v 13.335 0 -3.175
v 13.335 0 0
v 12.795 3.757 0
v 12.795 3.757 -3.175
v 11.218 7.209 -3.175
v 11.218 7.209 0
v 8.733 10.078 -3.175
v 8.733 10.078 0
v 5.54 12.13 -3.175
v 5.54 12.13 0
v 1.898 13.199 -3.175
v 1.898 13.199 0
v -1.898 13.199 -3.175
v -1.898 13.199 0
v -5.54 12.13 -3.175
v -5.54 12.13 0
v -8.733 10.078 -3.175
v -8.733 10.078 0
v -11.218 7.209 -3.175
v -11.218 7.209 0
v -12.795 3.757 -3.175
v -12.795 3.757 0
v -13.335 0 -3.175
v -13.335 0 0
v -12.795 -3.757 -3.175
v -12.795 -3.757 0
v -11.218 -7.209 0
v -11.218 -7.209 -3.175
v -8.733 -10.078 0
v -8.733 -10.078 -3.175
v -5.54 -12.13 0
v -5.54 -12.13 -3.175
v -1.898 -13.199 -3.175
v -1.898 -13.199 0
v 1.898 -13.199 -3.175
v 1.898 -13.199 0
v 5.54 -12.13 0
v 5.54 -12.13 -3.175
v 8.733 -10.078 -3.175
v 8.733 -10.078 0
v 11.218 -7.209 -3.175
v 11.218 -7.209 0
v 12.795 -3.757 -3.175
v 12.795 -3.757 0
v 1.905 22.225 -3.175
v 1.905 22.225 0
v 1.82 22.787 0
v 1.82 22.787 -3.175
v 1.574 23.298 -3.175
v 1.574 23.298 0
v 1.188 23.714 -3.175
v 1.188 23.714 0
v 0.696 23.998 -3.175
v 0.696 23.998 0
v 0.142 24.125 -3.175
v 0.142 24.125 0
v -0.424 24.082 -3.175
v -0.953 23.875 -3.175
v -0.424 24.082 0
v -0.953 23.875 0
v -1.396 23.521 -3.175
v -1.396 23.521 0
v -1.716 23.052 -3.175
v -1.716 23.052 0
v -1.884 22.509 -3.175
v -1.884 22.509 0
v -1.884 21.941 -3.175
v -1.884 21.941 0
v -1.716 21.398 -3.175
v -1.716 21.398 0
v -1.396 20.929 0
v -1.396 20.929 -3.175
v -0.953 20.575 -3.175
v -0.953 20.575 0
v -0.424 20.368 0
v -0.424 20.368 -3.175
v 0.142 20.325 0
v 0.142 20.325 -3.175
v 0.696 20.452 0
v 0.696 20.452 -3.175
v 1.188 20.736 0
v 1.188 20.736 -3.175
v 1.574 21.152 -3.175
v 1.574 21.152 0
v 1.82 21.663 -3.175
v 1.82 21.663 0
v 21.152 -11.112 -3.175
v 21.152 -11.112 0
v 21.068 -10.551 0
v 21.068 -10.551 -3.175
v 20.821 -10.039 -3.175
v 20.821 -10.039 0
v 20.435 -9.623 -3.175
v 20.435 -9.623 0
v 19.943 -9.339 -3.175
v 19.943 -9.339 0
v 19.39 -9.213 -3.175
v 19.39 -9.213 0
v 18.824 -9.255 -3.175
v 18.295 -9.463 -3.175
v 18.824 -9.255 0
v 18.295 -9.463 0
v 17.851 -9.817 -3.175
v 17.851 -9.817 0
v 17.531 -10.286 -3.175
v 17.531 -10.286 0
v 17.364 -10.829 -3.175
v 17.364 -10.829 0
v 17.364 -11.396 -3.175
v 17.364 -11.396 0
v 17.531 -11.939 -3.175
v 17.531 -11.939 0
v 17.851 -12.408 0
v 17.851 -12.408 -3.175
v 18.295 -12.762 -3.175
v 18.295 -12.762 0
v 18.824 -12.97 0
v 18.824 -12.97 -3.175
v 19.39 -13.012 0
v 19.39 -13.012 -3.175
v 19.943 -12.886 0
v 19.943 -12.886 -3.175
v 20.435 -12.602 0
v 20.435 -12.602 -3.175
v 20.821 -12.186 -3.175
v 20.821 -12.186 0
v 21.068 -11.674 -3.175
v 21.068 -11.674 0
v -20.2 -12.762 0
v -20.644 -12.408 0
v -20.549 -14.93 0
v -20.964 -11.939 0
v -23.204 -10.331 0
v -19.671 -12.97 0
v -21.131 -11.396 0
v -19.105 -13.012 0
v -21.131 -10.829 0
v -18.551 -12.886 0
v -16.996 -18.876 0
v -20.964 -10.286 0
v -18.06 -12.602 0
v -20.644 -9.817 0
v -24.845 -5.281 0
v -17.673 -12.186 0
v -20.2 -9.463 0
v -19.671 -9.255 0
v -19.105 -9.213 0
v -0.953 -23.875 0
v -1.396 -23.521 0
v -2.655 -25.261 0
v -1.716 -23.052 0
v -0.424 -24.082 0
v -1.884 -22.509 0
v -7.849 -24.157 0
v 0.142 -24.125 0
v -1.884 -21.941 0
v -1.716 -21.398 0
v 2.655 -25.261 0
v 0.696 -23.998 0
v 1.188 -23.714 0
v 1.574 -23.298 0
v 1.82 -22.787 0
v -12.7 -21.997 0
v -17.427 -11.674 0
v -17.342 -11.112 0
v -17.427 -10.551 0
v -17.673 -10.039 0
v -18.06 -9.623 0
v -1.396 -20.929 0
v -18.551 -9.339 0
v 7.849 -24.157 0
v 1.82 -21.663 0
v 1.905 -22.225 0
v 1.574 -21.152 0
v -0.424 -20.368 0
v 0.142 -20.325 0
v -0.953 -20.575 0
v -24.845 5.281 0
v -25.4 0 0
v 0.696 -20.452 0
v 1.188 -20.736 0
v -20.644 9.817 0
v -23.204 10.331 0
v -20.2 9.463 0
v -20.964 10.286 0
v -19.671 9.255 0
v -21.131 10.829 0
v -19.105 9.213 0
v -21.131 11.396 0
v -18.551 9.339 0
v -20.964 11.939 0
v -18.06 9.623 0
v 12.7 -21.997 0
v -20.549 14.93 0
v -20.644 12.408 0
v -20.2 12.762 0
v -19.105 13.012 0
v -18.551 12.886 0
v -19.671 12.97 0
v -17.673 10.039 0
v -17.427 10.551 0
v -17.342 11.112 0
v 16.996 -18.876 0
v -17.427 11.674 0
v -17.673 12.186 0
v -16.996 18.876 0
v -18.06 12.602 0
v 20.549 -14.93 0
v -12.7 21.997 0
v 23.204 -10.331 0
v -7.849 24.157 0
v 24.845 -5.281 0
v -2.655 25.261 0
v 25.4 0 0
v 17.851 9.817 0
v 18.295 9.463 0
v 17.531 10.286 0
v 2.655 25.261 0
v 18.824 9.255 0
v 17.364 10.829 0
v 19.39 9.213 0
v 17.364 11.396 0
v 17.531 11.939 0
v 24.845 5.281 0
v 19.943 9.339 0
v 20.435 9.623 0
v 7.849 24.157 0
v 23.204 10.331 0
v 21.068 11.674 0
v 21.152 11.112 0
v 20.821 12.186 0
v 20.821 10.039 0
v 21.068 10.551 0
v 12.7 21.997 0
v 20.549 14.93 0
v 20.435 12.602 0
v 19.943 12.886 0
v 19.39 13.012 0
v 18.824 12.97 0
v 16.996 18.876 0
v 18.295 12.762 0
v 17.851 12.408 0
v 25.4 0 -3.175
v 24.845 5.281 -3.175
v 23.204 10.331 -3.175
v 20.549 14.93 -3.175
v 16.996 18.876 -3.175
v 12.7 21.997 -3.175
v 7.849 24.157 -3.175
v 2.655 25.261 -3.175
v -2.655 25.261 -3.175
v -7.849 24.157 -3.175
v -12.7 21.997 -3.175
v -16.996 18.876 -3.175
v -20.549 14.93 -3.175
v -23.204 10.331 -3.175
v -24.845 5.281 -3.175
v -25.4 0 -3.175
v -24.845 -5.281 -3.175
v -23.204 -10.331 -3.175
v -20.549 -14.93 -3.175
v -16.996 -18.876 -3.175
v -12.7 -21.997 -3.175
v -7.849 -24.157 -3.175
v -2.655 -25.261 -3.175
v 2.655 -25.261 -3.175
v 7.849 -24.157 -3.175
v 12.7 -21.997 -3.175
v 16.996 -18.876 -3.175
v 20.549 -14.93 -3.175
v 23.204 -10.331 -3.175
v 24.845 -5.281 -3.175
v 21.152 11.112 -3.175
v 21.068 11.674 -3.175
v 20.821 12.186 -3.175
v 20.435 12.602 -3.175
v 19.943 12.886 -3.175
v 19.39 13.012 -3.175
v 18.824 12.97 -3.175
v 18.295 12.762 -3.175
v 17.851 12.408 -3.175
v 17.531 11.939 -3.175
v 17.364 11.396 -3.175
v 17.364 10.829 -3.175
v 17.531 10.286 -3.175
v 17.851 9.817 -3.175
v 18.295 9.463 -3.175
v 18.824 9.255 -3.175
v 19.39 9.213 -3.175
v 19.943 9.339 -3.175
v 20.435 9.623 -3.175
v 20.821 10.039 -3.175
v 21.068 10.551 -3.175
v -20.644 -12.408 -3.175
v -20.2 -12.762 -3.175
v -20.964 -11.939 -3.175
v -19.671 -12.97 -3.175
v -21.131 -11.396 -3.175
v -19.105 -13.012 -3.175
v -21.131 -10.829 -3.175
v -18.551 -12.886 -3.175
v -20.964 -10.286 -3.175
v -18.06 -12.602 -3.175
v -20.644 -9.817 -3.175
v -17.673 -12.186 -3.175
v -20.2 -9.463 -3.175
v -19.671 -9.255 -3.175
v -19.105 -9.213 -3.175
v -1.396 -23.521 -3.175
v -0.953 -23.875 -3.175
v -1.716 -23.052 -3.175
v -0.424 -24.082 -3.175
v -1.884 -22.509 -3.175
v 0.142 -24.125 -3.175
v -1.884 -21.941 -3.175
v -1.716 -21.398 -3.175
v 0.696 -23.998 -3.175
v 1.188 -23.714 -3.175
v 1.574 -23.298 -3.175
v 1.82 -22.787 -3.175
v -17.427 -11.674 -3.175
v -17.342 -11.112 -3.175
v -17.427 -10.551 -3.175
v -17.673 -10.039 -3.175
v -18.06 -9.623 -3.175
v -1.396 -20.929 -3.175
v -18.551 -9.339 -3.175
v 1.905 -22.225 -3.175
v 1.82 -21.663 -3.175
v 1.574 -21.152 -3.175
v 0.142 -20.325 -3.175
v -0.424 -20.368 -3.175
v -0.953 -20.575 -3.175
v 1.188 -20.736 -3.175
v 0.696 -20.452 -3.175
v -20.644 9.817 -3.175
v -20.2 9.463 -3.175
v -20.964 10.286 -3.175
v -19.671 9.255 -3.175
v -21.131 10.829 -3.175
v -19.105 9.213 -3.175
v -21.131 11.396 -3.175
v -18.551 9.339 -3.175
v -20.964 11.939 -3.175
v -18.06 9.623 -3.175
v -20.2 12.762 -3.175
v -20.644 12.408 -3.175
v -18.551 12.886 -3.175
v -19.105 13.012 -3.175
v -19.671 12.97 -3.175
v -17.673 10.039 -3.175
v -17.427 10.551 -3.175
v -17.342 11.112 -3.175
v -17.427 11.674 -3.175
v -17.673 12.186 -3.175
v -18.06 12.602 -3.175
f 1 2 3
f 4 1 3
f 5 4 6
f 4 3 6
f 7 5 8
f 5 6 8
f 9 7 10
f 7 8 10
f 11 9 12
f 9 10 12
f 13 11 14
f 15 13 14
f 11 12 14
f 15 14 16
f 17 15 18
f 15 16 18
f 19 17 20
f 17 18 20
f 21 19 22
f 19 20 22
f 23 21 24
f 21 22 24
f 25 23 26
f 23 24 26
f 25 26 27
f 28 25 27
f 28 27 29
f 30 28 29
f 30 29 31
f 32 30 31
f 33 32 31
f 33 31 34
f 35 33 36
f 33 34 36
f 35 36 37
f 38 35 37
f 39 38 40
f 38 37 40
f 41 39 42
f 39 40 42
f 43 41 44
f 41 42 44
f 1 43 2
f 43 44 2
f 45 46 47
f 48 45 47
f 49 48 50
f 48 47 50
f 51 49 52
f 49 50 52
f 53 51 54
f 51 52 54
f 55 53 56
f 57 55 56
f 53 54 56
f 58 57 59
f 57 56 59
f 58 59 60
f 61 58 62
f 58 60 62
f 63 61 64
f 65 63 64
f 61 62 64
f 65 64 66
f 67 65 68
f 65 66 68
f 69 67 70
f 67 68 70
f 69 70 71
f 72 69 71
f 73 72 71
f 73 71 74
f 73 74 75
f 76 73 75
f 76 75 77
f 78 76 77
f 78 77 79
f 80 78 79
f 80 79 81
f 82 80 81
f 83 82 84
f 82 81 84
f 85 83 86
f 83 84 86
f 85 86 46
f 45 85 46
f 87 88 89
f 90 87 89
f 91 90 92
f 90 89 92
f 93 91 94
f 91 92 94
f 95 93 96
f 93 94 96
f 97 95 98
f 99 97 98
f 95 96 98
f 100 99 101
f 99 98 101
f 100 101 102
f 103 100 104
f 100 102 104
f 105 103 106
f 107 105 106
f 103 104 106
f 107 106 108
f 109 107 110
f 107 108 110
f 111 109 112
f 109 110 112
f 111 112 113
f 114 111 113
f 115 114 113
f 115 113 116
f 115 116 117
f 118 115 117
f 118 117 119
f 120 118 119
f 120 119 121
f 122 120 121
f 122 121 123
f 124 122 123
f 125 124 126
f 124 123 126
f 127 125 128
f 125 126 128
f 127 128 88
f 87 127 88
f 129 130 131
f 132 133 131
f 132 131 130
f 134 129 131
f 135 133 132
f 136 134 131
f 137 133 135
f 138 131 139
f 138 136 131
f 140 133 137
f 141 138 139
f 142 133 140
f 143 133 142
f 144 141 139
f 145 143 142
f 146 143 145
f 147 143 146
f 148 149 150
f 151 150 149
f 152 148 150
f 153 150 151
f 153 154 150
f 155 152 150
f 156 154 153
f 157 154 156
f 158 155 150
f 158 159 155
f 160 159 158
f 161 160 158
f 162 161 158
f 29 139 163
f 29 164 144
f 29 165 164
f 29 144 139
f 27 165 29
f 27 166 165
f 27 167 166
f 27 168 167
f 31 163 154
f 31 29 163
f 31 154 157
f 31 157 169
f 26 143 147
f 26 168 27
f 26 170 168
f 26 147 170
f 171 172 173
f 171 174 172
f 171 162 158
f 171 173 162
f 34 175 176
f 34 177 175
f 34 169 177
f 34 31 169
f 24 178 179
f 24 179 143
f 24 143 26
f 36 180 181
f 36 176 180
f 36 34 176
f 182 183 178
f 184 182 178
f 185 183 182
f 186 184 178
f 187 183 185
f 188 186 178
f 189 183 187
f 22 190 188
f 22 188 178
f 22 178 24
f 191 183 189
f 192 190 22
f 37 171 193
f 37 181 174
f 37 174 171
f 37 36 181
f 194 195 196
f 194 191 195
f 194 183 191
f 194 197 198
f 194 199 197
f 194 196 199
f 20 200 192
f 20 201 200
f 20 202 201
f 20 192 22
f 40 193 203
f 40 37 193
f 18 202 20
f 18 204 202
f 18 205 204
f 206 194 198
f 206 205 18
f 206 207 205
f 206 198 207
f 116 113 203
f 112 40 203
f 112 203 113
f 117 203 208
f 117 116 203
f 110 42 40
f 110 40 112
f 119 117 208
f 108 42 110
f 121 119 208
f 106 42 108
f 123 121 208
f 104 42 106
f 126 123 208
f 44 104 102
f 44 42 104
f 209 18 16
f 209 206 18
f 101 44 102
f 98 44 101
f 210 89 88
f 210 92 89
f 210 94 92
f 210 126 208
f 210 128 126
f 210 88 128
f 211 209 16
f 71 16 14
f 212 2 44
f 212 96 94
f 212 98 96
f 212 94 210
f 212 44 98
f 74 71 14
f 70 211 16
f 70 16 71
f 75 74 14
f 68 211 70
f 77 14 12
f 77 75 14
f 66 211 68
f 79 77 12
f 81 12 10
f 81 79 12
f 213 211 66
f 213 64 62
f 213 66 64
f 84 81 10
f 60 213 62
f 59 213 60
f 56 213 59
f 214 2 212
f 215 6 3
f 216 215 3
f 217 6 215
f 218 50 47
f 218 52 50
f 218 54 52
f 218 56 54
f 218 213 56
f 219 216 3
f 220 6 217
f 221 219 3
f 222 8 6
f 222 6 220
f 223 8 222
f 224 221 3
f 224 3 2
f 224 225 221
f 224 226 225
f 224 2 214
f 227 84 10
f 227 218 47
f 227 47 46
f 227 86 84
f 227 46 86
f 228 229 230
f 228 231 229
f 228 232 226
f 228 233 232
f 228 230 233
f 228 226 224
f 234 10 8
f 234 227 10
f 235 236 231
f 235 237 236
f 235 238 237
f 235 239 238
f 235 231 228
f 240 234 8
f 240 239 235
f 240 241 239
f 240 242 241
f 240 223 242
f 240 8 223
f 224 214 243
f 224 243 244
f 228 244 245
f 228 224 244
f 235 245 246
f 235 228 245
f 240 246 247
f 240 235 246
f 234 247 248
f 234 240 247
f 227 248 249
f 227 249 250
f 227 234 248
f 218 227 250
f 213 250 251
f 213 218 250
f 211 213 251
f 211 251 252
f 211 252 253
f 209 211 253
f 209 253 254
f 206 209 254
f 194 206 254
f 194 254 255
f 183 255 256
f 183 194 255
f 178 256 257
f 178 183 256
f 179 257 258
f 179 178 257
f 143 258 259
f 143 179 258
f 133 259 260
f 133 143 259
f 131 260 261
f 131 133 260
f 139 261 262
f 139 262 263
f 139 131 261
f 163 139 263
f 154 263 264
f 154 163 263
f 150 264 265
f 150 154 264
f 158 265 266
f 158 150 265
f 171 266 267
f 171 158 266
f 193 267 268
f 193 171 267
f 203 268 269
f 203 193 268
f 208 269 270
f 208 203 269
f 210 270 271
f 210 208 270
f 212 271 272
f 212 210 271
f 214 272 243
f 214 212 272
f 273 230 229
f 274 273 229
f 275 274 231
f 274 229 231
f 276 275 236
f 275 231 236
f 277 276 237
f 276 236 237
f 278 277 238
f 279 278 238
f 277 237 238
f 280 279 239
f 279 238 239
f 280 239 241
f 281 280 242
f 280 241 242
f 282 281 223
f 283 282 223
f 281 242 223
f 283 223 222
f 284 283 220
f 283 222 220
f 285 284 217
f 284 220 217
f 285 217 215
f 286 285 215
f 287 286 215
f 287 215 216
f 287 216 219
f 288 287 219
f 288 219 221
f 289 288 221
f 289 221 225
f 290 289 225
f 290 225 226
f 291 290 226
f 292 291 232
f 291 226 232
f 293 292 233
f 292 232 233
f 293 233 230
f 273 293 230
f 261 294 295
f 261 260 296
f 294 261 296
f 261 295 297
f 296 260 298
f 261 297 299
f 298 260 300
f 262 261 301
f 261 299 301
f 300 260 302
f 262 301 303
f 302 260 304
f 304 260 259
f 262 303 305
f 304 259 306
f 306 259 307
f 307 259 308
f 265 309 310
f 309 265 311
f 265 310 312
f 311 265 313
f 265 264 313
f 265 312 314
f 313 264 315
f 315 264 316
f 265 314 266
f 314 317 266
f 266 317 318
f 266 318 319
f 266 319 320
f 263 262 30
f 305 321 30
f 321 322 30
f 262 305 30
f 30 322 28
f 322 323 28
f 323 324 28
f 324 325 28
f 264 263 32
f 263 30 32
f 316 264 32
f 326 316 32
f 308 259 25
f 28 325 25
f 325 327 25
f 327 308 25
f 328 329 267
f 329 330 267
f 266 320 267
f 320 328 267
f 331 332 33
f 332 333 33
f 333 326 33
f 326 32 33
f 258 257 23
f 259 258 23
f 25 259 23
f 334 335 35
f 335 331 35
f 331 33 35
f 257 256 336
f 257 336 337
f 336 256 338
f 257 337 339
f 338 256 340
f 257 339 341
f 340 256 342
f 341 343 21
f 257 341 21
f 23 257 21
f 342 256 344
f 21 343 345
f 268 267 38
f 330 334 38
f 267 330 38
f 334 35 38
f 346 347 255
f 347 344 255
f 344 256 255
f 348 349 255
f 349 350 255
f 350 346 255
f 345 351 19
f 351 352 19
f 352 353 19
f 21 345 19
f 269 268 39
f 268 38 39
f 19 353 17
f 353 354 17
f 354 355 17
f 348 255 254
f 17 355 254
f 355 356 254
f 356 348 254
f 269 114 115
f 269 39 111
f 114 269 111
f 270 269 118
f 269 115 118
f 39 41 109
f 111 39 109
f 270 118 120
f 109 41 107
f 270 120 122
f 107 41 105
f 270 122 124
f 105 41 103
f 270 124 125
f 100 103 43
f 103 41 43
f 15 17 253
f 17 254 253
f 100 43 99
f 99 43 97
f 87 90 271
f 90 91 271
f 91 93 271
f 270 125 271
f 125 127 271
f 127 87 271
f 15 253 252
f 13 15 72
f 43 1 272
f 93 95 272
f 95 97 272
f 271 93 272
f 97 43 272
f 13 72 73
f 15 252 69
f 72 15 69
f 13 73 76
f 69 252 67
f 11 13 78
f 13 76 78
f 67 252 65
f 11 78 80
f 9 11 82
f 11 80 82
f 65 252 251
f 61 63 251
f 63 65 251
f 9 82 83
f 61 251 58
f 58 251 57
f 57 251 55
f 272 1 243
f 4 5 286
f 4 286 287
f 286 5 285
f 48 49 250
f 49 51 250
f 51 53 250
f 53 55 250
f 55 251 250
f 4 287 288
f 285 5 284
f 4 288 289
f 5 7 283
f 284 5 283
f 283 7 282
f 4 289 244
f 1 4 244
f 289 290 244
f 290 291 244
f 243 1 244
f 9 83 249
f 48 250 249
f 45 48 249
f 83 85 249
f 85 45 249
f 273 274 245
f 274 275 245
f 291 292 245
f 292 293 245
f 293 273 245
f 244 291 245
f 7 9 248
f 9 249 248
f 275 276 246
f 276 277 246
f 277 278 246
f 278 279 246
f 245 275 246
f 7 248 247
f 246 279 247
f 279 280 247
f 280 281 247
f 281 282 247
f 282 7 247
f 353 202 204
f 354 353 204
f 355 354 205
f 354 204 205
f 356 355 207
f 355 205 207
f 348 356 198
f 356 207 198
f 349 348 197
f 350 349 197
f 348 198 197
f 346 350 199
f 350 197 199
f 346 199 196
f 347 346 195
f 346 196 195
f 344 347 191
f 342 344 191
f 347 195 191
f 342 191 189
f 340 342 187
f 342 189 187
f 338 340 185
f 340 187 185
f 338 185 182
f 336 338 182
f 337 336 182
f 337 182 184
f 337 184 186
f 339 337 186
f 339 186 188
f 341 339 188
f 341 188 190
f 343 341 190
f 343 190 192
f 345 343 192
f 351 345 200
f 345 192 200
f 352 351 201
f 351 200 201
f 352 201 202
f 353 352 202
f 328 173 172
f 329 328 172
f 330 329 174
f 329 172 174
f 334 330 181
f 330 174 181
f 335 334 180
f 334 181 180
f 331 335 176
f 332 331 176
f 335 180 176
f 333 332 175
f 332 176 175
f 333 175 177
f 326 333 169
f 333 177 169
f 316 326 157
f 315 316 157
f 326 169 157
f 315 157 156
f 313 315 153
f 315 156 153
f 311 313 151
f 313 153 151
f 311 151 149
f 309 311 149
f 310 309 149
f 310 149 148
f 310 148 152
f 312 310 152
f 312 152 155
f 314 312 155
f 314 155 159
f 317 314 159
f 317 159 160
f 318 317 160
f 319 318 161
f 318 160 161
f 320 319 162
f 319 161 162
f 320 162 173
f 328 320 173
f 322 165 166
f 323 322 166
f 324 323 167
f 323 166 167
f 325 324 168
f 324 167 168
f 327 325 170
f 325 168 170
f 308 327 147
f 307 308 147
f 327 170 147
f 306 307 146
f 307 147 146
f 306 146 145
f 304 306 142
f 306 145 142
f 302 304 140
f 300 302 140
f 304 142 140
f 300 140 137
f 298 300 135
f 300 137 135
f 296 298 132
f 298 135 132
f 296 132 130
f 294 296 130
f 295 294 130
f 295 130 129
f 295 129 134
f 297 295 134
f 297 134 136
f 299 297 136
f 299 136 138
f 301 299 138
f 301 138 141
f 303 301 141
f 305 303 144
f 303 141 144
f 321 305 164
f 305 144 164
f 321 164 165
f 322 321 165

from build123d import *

# Parameters (mm, degrees)
BASE_SKETCH_R      = 25.4
BASE_SKETCH_R_2    = 13.335
BASE_SKETCH_R_3    = 1.905
BASE_EXTRUDE_DEPTH = 3.175


with BuildPart() as part:
    # Base Sketch → Base Extrude (new body)
    with BuildSketch(Plane.XY):
        Circle(BASE_SKETCH_R)
        Circle(BASE_SKETCH_R_2, mode=Mode.SUBTRACT)
        with Locations((0, 22.225)):
            Circle(BASE_SKETCH_R_3, mode=Mode.SUBTRACT)
        with Locations((19.247414599, 11.1125)):
            Circle(BASE_SKETCH_R_3, mode=Mode.SUBTRACT)
        with Locations((19.247414599, -11.1125)):
            Circle(BASE_SKETCH_R_3, mode=Mode.SUBTRACT)
        with Locations((0, -22.225)):
            Circle(BASE_SKETCH_R_3, mode=Mode.SUBTRACT)
        with Locations((-19.247414599, -11.1125)):
            Circle(BASE_SKETCH_R_3, mode=Mode.SUBTRACT)
        with Locations((-19.247414599, 11.1125)):
            Circle(BASE_SKETCH_R_3, mode=Mode.SUBTRACT)
    extrude(amount=-BASE_EXTRUDE_DEPTH)


solid = part.part
